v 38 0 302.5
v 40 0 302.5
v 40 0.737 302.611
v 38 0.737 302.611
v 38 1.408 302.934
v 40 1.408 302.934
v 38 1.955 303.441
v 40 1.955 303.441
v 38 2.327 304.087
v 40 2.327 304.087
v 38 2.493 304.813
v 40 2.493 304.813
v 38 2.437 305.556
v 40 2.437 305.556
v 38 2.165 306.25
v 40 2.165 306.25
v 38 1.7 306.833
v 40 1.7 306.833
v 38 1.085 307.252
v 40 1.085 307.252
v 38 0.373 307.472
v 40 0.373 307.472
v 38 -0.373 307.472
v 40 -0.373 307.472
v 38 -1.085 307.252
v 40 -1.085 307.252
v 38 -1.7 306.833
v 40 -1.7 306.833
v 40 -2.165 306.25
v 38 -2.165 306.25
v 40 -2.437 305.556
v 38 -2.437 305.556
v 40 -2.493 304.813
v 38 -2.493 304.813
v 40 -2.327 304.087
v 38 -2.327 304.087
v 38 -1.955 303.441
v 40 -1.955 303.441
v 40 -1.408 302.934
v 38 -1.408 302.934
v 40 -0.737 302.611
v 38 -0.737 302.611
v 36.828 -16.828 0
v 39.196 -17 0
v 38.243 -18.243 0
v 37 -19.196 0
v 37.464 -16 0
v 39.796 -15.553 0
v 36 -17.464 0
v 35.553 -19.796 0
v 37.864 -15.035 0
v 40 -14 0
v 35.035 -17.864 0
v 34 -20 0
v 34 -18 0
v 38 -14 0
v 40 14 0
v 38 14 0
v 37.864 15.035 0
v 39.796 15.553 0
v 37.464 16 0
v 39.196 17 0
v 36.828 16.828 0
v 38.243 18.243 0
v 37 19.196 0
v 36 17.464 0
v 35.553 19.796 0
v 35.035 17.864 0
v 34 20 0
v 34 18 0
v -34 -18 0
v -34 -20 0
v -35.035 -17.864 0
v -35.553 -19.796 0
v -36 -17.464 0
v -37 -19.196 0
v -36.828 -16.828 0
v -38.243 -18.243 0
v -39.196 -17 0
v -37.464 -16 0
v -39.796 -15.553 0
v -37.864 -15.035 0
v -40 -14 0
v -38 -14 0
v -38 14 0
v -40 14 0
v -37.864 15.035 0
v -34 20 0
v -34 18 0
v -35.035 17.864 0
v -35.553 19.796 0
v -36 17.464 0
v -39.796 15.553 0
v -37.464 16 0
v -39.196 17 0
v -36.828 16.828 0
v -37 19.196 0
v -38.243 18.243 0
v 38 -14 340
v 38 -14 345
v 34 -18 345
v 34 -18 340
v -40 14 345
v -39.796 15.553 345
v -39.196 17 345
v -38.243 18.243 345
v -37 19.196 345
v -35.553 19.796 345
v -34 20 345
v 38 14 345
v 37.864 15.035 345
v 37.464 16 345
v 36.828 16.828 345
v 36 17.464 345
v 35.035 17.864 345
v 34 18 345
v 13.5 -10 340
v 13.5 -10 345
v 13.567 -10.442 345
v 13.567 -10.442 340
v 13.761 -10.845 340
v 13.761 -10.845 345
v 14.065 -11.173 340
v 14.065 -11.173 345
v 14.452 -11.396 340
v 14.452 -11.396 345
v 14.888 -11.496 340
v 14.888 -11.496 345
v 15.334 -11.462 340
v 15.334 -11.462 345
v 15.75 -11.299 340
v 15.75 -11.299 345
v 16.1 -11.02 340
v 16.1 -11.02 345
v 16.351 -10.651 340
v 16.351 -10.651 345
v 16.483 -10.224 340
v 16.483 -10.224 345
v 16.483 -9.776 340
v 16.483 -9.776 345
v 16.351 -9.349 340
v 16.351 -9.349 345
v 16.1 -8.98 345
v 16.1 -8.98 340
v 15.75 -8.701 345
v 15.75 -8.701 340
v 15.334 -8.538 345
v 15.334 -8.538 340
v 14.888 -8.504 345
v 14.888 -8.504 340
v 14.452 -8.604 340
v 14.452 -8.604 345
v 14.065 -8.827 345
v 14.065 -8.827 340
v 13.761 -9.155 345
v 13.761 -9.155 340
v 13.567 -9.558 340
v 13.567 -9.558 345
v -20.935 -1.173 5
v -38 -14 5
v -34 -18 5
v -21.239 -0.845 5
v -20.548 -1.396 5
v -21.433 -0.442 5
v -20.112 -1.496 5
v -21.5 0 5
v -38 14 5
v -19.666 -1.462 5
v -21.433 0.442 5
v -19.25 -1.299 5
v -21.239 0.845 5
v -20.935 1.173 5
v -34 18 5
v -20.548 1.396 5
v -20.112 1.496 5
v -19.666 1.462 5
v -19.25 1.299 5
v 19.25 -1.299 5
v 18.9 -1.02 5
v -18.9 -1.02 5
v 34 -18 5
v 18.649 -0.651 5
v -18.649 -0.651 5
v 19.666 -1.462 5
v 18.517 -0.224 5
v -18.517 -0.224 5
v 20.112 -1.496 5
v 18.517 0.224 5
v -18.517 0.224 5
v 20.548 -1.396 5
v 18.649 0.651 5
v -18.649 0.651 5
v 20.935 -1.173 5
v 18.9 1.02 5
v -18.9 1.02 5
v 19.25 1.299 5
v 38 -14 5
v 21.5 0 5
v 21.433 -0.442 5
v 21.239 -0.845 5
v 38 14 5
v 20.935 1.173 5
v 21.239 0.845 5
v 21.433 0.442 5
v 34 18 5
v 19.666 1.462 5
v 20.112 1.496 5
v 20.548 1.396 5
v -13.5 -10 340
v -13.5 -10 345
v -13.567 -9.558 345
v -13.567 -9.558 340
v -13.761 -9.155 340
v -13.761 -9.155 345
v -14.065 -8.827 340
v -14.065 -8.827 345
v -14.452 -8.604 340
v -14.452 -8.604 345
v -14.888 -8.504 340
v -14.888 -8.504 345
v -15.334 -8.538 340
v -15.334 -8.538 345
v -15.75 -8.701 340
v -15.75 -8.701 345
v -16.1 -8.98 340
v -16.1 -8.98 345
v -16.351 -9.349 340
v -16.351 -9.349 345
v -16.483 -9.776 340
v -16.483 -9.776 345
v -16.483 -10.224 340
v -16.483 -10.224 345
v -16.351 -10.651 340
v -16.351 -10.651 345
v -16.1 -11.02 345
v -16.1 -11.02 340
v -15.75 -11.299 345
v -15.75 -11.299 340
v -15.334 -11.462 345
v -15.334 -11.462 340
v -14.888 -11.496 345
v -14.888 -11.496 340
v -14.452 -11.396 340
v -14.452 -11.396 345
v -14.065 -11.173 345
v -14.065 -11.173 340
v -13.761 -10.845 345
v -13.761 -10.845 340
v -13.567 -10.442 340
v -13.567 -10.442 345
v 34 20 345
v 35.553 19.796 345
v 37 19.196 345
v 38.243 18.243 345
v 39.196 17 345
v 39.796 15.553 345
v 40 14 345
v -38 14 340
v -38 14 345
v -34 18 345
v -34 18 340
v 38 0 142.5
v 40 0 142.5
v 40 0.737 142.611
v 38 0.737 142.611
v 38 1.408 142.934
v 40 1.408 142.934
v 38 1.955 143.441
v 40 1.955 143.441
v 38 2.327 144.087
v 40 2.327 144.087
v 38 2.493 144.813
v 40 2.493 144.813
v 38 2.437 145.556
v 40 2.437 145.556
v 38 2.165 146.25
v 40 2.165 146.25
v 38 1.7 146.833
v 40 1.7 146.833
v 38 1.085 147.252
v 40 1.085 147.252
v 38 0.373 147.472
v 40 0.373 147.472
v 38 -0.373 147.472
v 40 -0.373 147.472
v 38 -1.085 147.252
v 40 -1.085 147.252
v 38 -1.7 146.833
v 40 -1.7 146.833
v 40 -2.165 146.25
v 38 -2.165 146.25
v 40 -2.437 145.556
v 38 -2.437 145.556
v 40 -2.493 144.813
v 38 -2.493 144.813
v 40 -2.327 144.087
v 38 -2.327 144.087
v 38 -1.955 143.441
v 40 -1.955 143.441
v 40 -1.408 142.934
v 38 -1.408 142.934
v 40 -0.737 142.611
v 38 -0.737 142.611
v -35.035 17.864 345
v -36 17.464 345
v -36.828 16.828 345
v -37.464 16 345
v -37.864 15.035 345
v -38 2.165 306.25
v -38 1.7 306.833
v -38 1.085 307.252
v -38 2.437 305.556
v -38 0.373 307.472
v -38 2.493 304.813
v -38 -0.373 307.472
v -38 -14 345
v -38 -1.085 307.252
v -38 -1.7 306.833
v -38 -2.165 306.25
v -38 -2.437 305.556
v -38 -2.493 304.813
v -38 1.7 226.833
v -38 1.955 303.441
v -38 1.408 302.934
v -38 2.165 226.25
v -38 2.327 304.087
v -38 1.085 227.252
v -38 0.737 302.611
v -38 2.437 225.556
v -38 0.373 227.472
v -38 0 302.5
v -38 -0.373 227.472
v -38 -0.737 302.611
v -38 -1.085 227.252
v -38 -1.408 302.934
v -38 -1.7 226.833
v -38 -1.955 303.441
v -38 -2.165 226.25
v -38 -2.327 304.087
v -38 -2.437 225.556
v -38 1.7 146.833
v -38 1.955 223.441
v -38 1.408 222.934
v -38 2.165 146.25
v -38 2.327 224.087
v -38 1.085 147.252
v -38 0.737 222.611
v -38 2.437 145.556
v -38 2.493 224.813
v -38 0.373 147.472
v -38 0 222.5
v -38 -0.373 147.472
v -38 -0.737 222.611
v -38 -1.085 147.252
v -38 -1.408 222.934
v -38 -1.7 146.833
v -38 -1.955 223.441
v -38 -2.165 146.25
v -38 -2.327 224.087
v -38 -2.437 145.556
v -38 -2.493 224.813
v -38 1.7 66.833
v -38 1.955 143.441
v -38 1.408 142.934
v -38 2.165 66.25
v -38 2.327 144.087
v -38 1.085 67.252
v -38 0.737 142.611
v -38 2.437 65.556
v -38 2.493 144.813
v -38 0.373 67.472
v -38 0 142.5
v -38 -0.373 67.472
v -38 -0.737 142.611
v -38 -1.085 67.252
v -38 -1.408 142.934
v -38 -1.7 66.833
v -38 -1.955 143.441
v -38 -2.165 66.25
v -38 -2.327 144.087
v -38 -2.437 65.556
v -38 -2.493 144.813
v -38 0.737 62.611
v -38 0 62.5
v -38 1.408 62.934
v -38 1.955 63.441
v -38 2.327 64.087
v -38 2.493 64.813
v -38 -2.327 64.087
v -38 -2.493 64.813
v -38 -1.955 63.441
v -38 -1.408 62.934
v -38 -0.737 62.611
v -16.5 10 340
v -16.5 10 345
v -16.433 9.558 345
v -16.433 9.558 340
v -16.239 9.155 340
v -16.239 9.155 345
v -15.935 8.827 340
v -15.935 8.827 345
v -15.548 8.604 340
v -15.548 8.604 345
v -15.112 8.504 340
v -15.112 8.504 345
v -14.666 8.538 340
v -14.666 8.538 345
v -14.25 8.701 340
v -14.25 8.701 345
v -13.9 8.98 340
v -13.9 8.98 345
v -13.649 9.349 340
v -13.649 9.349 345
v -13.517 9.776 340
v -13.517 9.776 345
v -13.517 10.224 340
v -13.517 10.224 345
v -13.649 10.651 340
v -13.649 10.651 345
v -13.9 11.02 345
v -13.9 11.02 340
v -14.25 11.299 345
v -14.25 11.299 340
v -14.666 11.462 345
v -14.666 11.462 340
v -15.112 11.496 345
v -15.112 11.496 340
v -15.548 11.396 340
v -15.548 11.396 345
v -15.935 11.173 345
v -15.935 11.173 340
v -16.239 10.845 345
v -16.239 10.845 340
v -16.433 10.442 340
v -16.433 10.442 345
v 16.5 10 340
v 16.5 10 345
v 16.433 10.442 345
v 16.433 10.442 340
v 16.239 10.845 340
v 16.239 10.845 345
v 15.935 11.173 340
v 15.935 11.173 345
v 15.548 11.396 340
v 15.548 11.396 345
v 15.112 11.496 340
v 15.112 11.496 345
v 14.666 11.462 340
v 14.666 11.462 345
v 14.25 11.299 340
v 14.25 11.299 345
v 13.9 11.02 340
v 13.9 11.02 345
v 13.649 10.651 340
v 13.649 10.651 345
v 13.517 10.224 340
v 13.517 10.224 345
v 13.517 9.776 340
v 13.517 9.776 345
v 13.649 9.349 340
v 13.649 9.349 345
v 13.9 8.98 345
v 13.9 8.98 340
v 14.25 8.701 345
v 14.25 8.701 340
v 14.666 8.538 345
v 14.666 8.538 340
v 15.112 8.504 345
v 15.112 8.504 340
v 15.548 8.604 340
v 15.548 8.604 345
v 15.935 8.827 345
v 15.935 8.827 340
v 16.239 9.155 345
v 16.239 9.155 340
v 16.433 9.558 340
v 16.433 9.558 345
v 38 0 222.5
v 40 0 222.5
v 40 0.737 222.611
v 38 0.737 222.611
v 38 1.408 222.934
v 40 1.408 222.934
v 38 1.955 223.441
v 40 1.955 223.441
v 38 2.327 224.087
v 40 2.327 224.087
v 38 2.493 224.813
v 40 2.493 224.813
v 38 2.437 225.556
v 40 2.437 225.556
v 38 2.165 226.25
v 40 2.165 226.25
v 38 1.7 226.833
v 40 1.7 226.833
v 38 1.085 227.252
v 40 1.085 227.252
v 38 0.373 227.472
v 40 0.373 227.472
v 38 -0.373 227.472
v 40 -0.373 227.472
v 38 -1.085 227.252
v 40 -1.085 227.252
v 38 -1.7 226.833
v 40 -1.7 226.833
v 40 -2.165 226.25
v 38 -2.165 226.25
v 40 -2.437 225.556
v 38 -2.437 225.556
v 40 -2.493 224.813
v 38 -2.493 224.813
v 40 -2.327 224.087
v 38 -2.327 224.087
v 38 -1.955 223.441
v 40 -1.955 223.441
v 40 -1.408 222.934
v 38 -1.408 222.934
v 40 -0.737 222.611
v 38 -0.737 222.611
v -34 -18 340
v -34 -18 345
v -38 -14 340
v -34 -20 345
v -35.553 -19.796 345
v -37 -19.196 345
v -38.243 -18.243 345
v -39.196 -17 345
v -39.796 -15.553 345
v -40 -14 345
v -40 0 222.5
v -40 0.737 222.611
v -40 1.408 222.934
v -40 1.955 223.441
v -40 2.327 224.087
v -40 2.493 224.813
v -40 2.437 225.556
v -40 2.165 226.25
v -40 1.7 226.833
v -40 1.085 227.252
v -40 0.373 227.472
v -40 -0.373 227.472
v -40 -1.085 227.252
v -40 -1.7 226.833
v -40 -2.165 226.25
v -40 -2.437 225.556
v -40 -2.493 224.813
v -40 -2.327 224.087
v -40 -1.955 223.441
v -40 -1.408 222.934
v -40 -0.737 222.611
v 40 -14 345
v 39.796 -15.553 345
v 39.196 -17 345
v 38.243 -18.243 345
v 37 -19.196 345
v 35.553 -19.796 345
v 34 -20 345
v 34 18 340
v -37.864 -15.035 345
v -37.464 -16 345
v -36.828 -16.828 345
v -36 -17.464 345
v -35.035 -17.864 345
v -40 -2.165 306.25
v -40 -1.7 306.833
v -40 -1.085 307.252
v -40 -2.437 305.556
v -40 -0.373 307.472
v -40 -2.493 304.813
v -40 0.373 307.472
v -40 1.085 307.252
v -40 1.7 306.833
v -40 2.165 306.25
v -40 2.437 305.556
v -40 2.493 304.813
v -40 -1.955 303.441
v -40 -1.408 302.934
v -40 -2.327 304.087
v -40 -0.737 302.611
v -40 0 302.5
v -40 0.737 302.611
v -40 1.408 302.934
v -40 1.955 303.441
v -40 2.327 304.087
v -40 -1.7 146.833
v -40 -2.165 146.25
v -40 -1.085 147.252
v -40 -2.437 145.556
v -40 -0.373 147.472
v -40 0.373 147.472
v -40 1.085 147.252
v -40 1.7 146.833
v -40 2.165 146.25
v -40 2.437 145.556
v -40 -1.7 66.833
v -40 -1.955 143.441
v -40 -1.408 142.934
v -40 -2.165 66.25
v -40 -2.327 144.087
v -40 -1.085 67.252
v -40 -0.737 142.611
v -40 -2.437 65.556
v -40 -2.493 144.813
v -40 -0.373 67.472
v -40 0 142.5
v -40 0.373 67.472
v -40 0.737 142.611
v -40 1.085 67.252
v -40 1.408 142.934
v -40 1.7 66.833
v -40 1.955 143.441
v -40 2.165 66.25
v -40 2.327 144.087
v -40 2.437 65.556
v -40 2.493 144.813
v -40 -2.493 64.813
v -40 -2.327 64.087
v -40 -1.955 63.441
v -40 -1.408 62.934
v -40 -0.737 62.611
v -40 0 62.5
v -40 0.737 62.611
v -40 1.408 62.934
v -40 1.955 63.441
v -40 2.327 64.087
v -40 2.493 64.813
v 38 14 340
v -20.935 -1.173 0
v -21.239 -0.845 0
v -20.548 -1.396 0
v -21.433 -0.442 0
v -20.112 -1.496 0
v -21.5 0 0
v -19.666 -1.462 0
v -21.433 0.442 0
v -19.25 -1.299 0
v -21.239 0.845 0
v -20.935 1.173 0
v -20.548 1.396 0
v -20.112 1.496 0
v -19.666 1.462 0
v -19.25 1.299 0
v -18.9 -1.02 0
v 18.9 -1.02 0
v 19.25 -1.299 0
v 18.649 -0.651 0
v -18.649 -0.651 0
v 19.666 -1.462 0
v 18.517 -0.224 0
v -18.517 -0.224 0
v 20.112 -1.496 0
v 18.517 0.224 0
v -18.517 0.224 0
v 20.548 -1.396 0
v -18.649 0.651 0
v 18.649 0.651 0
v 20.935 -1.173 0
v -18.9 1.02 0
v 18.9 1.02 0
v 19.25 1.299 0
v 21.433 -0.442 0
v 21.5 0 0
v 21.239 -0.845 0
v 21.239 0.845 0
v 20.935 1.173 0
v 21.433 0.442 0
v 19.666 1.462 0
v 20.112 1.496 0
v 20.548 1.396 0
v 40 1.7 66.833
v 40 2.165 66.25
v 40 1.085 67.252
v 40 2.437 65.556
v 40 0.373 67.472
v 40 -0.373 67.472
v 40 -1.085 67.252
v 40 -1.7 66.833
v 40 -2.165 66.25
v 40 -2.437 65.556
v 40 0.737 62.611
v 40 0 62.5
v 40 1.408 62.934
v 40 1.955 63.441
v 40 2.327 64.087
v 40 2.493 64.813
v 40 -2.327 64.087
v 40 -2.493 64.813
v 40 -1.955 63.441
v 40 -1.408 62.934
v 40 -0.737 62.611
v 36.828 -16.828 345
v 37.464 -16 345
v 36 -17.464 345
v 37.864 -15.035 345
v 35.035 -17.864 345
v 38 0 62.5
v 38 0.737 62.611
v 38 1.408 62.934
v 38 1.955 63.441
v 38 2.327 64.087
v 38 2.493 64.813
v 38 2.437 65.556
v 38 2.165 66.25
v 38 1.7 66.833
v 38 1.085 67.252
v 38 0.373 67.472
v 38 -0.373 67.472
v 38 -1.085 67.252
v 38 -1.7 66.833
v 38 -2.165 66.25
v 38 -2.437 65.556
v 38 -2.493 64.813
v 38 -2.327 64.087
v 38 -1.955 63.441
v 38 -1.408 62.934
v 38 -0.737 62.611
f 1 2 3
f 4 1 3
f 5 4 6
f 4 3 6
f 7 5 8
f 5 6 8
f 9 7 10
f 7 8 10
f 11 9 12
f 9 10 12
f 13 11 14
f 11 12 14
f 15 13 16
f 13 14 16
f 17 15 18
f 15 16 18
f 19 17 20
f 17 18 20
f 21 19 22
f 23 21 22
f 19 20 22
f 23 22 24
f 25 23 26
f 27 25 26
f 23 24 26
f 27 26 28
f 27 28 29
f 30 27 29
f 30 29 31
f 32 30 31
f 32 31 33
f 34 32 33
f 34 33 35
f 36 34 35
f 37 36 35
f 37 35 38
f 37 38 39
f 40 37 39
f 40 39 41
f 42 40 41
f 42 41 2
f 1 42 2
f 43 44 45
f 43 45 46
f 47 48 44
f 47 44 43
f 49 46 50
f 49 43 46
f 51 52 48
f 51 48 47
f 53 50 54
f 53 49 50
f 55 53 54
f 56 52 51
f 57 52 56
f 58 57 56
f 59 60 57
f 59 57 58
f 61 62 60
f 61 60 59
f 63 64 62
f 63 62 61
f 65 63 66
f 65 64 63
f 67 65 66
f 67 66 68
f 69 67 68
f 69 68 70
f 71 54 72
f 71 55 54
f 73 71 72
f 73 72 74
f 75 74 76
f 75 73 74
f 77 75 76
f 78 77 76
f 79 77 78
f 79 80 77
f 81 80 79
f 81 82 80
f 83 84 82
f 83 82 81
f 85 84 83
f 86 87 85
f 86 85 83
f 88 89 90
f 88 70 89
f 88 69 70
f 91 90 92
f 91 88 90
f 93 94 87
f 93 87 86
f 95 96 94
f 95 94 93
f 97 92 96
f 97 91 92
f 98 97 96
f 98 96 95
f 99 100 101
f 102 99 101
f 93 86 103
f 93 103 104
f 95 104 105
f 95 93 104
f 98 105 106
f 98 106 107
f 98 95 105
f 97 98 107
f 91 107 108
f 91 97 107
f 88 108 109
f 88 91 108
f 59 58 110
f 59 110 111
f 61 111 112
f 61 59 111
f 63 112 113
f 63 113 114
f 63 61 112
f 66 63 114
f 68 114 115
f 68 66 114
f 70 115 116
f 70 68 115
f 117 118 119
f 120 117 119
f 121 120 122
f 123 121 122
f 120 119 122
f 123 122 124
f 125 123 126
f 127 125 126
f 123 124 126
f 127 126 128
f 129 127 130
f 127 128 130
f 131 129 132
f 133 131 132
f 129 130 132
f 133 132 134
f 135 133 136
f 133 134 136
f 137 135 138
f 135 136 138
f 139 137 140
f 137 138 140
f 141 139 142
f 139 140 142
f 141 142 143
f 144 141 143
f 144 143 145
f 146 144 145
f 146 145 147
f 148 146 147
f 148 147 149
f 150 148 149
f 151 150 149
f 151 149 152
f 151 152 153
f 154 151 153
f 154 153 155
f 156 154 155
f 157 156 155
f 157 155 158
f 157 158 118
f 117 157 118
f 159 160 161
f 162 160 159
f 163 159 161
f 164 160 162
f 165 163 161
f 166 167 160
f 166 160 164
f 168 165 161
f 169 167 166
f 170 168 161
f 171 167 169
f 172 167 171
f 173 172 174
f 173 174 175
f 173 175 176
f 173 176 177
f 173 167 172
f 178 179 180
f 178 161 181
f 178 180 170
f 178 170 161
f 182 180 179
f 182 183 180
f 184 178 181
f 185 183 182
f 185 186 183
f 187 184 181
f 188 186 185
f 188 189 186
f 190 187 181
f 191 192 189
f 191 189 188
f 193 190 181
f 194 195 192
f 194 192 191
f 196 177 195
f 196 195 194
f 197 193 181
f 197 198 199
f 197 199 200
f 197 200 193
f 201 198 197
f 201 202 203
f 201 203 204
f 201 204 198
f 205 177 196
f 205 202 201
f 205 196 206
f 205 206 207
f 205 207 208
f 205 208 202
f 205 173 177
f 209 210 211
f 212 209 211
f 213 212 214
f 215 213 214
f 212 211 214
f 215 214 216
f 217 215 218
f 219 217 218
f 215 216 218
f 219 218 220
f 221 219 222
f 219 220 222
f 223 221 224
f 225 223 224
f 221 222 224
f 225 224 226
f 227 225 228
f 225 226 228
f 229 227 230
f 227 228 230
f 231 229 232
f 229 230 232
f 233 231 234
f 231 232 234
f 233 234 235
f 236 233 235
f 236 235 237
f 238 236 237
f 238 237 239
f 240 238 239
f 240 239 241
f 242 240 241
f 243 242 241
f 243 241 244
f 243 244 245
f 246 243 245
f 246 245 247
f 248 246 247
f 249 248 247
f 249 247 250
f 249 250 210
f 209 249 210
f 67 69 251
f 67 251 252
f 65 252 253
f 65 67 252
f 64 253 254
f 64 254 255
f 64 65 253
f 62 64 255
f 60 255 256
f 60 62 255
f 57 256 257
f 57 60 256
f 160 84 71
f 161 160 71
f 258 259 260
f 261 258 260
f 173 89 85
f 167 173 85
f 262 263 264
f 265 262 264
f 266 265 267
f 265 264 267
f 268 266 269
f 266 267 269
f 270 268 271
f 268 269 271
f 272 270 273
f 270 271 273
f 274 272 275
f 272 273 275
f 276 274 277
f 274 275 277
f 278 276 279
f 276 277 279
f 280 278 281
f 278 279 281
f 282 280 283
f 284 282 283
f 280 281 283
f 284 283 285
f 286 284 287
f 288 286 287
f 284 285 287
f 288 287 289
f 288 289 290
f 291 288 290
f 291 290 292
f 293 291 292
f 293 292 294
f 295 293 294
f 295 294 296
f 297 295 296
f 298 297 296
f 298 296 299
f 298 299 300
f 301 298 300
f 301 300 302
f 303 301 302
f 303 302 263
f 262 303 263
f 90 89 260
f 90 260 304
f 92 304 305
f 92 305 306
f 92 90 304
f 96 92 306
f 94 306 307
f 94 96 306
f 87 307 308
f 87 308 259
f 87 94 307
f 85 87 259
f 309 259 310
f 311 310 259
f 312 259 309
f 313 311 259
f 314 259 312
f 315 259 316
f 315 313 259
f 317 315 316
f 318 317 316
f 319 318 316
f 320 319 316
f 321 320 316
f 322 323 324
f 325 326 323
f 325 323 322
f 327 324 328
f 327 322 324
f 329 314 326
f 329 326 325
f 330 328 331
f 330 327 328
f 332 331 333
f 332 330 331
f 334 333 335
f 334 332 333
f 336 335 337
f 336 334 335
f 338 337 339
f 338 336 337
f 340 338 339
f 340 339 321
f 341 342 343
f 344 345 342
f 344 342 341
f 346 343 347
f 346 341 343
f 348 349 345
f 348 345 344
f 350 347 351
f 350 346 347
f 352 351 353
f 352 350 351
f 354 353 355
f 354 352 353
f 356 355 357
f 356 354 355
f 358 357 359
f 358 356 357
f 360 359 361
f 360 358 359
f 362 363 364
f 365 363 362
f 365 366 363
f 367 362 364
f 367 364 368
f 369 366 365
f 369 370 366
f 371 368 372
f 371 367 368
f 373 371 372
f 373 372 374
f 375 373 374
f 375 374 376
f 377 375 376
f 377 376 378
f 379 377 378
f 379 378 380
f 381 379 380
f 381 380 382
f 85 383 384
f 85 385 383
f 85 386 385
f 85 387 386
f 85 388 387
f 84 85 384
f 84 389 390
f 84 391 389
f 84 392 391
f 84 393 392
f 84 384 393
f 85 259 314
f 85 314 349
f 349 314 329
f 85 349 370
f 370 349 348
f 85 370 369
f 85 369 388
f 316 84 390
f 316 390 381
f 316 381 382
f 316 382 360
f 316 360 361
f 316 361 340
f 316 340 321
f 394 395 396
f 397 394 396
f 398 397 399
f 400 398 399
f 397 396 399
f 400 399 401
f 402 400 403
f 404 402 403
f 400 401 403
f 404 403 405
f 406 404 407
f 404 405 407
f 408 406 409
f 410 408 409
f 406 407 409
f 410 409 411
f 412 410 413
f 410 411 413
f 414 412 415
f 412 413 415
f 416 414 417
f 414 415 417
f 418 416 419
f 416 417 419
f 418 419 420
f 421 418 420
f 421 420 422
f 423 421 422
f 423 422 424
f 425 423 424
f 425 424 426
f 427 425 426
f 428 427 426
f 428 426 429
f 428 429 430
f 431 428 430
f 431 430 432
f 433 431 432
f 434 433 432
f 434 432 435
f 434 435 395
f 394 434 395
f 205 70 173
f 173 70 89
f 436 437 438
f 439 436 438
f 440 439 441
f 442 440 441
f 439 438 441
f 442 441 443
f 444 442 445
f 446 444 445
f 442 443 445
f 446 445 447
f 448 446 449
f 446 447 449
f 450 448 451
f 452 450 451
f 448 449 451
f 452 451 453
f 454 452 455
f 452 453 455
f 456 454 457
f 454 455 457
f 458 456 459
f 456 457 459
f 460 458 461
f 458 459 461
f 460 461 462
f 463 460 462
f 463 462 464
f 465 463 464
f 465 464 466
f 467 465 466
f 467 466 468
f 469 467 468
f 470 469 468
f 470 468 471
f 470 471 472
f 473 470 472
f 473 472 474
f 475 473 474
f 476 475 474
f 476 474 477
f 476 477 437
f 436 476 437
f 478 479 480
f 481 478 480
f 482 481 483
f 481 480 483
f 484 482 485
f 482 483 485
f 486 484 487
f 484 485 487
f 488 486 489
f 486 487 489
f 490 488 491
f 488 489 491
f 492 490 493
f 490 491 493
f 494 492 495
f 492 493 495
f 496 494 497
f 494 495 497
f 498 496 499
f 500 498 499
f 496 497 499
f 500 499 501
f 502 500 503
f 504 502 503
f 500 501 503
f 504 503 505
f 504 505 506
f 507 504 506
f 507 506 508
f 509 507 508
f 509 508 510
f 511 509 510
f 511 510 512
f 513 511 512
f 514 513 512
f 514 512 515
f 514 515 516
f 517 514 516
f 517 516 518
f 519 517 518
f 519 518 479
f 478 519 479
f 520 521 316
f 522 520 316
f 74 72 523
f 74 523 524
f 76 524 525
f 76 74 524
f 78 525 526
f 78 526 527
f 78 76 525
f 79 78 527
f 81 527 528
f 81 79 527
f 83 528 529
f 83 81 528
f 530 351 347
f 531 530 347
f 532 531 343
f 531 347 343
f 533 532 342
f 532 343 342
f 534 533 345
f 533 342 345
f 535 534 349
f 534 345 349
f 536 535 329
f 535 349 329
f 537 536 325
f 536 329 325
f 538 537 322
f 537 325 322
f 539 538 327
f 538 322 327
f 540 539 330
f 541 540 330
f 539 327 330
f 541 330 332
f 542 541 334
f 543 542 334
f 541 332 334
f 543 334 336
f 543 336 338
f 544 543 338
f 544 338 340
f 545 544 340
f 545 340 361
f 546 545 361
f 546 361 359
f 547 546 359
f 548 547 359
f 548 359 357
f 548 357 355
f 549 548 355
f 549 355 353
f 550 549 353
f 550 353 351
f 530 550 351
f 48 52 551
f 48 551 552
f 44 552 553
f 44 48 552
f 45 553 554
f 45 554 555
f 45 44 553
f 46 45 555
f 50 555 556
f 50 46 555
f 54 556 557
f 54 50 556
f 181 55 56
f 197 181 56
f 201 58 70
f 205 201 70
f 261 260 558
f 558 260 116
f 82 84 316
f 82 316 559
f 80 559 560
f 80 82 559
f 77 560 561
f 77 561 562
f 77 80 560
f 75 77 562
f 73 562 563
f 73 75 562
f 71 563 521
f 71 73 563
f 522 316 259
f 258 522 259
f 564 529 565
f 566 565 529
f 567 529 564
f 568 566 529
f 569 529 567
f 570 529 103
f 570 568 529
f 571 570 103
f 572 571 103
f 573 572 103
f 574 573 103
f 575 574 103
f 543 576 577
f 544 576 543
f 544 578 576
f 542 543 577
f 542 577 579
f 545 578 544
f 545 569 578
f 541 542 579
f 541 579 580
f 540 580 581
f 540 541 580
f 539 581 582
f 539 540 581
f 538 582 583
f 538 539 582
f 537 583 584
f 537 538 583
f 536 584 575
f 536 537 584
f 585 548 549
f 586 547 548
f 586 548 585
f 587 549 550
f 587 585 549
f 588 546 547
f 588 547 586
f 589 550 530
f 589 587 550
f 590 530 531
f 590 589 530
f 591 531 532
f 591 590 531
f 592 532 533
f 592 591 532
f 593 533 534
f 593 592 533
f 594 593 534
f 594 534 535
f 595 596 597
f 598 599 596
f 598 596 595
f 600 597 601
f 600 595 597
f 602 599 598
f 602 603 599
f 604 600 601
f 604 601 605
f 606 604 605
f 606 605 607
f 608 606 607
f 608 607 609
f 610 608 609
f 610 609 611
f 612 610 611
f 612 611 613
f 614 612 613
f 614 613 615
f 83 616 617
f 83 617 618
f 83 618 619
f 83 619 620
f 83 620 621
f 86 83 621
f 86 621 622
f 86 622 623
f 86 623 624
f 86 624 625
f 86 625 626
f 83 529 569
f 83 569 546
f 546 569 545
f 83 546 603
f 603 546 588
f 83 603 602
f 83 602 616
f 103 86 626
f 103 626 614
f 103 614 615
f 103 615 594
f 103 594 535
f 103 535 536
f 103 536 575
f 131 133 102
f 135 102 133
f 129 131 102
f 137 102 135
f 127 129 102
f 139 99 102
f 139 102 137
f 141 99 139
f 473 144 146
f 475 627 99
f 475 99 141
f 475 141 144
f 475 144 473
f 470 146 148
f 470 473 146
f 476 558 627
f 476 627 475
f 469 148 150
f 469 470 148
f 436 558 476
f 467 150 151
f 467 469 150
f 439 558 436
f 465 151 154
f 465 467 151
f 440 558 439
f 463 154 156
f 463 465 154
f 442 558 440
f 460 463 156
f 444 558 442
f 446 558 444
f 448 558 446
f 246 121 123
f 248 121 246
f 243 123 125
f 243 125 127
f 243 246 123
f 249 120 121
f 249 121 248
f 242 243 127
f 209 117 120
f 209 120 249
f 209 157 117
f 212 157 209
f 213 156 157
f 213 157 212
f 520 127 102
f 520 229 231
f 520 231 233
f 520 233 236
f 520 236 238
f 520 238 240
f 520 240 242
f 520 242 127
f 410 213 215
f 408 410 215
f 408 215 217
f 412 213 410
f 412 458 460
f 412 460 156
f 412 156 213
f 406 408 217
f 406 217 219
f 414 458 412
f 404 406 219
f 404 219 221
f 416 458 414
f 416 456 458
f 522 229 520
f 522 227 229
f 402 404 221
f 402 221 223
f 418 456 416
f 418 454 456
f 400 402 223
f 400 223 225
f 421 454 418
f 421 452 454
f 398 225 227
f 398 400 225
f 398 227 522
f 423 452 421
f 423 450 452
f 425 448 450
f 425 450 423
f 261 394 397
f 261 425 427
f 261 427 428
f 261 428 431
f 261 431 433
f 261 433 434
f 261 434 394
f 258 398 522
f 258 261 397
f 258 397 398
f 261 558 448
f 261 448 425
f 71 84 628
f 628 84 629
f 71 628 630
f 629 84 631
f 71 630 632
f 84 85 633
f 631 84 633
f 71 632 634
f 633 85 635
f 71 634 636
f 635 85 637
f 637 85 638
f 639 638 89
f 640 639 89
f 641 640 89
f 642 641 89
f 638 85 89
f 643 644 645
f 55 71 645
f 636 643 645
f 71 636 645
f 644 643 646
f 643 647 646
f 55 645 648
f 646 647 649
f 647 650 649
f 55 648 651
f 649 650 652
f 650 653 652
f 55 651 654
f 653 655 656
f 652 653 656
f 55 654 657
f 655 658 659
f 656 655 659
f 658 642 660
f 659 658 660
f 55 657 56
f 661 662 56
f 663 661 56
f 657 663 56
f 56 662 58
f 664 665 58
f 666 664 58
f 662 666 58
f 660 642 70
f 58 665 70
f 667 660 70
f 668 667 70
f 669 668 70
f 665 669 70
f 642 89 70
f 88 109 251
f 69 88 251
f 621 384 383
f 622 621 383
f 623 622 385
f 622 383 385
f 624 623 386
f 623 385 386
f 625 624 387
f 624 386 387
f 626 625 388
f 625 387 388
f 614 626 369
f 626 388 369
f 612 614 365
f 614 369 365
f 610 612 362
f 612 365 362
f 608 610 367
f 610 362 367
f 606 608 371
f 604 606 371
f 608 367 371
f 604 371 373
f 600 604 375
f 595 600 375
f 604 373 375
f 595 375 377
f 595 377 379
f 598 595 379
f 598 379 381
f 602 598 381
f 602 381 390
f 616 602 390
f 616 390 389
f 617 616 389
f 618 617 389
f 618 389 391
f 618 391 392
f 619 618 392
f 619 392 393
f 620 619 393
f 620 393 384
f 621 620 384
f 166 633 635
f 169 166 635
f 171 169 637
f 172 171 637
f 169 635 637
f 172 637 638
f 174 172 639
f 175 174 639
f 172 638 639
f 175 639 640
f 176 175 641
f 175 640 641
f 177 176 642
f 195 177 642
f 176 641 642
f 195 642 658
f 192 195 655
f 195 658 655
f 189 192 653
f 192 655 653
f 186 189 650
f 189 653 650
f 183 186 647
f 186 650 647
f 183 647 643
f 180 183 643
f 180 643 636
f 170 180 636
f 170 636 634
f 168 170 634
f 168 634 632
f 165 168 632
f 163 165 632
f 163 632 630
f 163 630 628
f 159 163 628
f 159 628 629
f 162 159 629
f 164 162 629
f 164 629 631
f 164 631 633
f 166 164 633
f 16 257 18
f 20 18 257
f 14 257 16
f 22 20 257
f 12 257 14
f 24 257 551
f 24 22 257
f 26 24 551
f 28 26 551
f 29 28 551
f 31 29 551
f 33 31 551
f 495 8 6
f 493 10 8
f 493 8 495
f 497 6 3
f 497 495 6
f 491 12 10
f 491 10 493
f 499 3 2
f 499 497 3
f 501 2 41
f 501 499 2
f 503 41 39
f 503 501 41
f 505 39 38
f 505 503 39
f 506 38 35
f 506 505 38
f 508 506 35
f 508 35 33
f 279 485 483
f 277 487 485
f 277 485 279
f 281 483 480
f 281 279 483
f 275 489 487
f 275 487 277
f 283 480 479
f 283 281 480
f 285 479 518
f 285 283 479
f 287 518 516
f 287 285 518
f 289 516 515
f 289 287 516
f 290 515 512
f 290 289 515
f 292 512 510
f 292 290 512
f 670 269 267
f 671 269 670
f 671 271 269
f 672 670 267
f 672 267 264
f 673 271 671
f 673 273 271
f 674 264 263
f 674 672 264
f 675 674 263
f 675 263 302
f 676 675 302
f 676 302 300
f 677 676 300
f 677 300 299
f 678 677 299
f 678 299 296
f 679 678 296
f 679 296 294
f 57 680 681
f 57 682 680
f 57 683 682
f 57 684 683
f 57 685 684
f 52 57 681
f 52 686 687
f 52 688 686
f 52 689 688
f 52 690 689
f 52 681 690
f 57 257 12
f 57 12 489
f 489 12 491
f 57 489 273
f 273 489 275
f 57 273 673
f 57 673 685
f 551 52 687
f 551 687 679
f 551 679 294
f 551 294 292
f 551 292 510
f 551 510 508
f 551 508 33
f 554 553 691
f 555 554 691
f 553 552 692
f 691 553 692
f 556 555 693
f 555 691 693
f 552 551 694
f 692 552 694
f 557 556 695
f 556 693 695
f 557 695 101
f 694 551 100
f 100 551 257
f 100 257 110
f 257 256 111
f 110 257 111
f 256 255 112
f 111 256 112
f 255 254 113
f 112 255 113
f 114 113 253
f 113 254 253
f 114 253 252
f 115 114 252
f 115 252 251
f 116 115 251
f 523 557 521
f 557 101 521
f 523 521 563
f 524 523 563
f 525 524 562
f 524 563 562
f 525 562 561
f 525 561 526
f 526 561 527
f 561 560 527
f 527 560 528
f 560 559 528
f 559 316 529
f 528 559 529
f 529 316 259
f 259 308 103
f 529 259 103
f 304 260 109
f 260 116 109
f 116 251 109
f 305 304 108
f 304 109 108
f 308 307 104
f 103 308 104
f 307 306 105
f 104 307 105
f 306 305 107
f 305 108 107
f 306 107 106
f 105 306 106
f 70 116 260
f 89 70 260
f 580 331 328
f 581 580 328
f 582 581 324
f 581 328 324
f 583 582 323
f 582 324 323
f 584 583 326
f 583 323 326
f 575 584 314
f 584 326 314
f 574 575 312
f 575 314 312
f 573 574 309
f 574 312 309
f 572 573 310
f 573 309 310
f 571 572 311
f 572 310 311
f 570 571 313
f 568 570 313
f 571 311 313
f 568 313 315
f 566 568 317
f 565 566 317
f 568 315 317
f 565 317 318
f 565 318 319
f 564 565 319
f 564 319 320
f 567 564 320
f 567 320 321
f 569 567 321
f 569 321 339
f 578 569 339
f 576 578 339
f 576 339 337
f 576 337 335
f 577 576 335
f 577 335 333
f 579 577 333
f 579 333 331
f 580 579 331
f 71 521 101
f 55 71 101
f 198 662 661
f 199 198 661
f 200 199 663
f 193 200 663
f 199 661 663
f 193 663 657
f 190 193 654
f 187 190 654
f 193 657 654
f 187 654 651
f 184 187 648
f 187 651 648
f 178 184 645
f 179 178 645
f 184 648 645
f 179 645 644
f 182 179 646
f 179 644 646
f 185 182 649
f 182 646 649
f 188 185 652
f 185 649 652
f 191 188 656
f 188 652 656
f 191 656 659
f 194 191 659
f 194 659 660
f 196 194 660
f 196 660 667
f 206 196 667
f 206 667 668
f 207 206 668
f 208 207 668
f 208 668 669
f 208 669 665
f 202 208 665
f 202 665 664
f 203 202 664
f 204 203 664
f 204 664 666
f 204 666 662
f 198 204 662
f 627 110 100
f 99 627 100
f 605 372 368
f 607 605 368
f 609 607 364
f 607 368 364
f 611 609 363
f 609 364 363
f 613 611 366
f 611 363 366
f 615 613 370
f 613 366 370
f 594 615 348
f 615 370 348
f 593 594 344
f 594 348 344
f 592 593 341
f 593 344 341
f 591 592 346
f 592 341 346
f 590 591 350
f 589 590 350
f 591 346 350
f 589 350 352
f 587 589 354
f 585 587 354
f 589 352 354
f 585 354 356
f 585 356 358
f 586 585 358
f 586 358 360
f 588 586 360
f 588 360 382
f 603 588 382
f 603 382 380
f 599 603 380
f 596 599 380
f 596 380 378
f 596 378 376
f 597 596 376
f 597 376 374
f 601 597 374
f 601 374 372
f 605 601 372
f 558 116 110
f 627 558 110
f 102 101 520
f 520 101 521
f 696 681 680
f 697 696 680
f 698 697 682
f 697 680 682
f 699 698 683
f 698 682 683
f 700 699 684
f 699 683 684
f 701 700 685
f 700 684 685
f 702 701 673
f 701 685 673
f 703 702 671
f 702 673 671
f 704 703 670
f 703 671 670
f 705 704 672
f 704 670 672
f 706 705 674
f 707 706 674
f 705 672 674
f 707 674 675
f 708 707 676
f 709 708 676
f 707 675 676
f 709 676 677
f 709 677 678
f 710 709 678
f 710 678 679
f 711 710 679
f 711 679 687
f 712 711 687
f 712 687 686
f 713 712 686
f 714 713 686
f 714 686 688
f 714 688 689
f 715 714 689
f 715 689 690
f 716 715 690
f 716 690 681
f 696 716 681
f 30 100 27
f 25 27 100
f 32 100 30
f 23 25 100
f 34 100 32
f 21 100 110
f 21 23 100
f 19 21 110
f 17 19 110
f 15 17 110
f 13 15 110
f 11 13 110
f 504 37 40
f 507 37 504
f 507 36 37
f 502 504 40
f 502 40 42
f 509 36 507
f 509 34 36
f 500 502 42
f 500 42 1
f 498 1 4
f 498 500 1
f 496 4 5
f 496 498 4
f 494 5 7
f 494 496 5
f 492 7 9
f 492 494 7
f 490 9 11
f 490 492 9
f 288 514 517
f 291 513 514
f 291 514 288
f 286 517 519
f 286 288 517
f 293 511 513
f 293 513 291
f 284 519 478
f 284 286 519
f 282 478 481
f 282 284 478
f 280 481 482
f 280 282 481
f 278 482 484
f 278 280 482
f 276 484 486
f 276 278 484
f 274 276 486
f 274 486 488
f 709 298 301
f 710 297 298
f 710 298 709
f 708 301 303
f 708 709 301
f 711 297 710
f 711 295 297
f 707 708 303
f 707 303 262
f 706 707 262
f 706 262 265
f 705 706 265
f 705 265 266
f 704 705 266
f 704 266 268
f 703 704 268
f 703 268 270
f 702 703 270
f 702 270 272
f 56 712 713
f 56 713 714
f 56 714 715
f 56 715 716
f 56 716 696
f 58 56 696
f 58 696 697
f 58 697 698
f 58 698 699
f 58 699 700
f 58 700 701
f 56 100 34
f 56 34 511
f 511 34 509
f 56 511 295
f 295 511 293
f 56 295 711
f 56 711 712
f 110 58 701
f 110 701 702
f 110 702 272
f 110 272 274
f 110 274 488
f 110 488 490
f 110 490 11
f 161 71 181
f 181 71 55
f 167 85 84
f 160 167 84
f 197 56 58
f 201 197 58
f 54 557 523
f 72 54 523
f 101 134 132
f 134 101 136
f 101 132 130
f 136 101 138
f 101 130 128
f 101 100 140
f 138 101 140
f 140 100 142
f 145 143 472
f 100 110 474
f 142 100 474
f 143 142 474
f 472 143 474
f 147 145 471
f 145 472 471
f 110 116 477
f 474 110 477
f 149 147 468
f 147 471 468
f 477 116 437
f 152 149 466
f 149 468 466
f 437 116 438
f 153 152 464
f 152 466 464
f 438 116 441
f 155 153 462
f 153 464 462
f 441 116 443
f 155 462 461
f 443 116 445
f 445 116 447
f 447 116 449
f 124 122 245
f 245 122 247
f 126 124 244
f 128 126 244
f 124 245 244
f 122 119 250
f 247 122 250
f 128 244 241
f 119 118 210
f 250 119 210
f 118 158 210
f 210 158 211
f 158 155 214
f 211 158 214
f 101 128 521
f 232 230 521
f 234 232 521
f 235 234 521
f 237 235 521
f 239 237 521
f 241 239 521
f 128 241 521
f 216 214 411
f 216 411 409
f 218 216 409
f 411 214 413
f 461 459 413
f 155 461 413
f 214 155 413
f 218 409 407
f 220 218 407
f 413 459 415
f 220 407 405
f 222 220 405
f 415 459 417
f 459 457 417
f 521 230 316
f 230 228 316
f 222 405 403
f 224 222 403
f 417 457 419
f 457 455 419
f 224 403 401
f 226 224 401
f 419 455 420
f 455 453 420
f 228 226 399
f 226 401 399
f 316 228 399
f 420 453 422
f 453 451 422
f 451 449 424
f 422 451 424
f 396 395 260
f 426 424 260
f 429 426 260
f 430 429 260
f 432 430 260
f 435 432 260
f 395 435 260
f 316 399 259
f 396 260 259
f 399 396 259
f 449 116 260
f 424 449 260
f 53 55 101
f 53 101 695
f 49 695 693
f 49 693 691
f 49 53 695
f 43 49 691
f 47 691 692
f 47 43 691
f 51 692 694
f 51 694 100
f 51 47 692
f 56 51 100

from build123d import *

# Parameters (mm, degrees)
AUFSATZ_LINEAR_AUSTRAGEN1_DEPTH = 345
AUFSATZ_LINEAR_AUSTRAGEN2_DEPTH = 5
AUFSATZ_LINEAR_AUSTRAGEN3_DEPTH = 5
SKIZZE4_R                       = 2.5
SCHNITT_LINEAR_AUSTRAGEN1_DEPTH = 100
SKIZZE5_R                       = 1.5
SCHNITT_LINEAR_AUSTRAGEN2_DEPTH = 10
SKIZZE6_R                       = 1.5
SCHNITT_LINEAR_AUSTRAGEN3_DEPTH = 10


with BuildPart() as part:
    # Skizze1 → Aufsatz-Linear austragen1 (new body)
    with BuildSketch(Plane.XY):
        with BuildLine():
            Line((-34, 20), (34, 20))
            ThreePointArc((34, 20), (38.242640687, 18.242640687), (40, 14))
            Line((40, 14), (40, -14))
            ThreePointArc((40, -14), (38.242640687, -18.242640687), (34, -20))
            Line((34, -20), (-34, -20))
            ThreePointArc((-34, -20), (-38.242640687, -18.242640687), (-40, -14))
            Line((-40, -14), (-40, 14))
            ThreePointArc((-40, 14), (-38.242640687, 18.242640687), (-34, 20))
        make_face()
        with BuildLine():
            Line((-38, 14), (-38, -14))
            ThreePointArc((-38, -14), (-36.828427125, -16.828427125), (-34, -18))
            Line((-34, -18), (34, -18))
            ThreePointArc((34, -18), (36.828427125, -16.828427125), (38, -14))
            Line((38, -14), (38, 14))
            ThreePointArc((38, 14), (36.828427125, 16.828427125), (34, 18))
            Line((34, 18), (-34, 18))
            ThreePointArc((-34, 18), (-36.828427125, 16.828427125), (-38, 14))
        make_face(mode=Mode.SUBTRACT)
    extrude(amount=AUFSATZ_LINEAR_AUSTRAGEN1_DEPTH)

    # Skizze4 → Schnitt-Linear austragen1 (cut)
    with BuildSketch(Plane(origin=(40, 0, 0), x_dir=(0, 0, -1), z_dir=(1, 0, 0))):
        with Locations((-305, 0)):
            Circle(SKIZZE4_R)
        with Locations((-225, 0)):
            Circle(SKIZZE4_R)
        with Locations((-145, 0)):
            Circle(SKIZZE4_R)
        with Locations((-65, 0)):
            Circle(SKIZZE4_R)
    extrude(amount=-SCHNITT_LINEAR_AUSTRAGEN1_DEPTH, mode=Mode.SUBTRACT)


with BuildPart() as body_2:
    # Skizze2 → Aufsatz-Linear austragen2 (new body)
    with BuildSketch(Plane(origin=(0, 0, 0), x_dir=(-1, 0, 0), z_dir=(0, 0, -1))):
        Polygon((38, 14), (38, -14), (34, -18), (-34, -18), (-38, -14), (-38, 14), (-34, 18), (34, 18), align=None)
    extrude(amount=-AUFSATZ_LINEAR_AUSTRAGEN2_DEPTH)

    # Skizze5 → Schnitt-Linear austragen2 (cut)
    with BuildSketch(Plane(origin=(0, 0, 0), x_dir=(-1, 0, 0), z_dir=(0, 0, -1))):
        with Locations((20, 0)):
            Circle(SKIZZE5_R)
        with Locations(Location((-20, 0, 0), (0, 0, 180))):
            Circle(SKIZZE5_R)
    extrude(amount=-SCHNITT_LINEAR_AUSTRAGEN2_DEPTH, mode=Mode.SUBTRACT)


with BuildPart() as body_3:
    # Skizze3 → Aufsatz-Linear austragen3 (new body)
    with BuildSketch(Plane.XY.offset(345)):
        Polygon((34, 18), (38, 14), (38, -14), (34, -18), (-34, -18), (-38, -14), (-38, 14), (-34, 18), align=None)
    extrude(amount=-AUFSATZ_LINEAR_AUSTRAGEN3_DEPTH)

    # Skizze6 → Schnitt-Linear austragen3 (cut)
    with BuildSketch(Plane.XY.offset(345)):
        with Locations((15, 10)):
            Circle(SKIZZE6_R)
        with Locations(Location((-15, 10, 0), (0, 0, 180))):
            Circle(SKIZZE6_R)
        with Locations(Location((15, -10, 0), (0, 0, 180))):
            Circle(SKIZZE6_R)
        with Locations((-15, -10)):
            Circle(SKIZZE6_R)
    extrude(amount=-SCHNITT_LINEAR_AUSTRAGEN3_DEPTH, mode=Mode.SUBTRACT)


solid = Compound([part.part, body_2.part, body_3.part])
